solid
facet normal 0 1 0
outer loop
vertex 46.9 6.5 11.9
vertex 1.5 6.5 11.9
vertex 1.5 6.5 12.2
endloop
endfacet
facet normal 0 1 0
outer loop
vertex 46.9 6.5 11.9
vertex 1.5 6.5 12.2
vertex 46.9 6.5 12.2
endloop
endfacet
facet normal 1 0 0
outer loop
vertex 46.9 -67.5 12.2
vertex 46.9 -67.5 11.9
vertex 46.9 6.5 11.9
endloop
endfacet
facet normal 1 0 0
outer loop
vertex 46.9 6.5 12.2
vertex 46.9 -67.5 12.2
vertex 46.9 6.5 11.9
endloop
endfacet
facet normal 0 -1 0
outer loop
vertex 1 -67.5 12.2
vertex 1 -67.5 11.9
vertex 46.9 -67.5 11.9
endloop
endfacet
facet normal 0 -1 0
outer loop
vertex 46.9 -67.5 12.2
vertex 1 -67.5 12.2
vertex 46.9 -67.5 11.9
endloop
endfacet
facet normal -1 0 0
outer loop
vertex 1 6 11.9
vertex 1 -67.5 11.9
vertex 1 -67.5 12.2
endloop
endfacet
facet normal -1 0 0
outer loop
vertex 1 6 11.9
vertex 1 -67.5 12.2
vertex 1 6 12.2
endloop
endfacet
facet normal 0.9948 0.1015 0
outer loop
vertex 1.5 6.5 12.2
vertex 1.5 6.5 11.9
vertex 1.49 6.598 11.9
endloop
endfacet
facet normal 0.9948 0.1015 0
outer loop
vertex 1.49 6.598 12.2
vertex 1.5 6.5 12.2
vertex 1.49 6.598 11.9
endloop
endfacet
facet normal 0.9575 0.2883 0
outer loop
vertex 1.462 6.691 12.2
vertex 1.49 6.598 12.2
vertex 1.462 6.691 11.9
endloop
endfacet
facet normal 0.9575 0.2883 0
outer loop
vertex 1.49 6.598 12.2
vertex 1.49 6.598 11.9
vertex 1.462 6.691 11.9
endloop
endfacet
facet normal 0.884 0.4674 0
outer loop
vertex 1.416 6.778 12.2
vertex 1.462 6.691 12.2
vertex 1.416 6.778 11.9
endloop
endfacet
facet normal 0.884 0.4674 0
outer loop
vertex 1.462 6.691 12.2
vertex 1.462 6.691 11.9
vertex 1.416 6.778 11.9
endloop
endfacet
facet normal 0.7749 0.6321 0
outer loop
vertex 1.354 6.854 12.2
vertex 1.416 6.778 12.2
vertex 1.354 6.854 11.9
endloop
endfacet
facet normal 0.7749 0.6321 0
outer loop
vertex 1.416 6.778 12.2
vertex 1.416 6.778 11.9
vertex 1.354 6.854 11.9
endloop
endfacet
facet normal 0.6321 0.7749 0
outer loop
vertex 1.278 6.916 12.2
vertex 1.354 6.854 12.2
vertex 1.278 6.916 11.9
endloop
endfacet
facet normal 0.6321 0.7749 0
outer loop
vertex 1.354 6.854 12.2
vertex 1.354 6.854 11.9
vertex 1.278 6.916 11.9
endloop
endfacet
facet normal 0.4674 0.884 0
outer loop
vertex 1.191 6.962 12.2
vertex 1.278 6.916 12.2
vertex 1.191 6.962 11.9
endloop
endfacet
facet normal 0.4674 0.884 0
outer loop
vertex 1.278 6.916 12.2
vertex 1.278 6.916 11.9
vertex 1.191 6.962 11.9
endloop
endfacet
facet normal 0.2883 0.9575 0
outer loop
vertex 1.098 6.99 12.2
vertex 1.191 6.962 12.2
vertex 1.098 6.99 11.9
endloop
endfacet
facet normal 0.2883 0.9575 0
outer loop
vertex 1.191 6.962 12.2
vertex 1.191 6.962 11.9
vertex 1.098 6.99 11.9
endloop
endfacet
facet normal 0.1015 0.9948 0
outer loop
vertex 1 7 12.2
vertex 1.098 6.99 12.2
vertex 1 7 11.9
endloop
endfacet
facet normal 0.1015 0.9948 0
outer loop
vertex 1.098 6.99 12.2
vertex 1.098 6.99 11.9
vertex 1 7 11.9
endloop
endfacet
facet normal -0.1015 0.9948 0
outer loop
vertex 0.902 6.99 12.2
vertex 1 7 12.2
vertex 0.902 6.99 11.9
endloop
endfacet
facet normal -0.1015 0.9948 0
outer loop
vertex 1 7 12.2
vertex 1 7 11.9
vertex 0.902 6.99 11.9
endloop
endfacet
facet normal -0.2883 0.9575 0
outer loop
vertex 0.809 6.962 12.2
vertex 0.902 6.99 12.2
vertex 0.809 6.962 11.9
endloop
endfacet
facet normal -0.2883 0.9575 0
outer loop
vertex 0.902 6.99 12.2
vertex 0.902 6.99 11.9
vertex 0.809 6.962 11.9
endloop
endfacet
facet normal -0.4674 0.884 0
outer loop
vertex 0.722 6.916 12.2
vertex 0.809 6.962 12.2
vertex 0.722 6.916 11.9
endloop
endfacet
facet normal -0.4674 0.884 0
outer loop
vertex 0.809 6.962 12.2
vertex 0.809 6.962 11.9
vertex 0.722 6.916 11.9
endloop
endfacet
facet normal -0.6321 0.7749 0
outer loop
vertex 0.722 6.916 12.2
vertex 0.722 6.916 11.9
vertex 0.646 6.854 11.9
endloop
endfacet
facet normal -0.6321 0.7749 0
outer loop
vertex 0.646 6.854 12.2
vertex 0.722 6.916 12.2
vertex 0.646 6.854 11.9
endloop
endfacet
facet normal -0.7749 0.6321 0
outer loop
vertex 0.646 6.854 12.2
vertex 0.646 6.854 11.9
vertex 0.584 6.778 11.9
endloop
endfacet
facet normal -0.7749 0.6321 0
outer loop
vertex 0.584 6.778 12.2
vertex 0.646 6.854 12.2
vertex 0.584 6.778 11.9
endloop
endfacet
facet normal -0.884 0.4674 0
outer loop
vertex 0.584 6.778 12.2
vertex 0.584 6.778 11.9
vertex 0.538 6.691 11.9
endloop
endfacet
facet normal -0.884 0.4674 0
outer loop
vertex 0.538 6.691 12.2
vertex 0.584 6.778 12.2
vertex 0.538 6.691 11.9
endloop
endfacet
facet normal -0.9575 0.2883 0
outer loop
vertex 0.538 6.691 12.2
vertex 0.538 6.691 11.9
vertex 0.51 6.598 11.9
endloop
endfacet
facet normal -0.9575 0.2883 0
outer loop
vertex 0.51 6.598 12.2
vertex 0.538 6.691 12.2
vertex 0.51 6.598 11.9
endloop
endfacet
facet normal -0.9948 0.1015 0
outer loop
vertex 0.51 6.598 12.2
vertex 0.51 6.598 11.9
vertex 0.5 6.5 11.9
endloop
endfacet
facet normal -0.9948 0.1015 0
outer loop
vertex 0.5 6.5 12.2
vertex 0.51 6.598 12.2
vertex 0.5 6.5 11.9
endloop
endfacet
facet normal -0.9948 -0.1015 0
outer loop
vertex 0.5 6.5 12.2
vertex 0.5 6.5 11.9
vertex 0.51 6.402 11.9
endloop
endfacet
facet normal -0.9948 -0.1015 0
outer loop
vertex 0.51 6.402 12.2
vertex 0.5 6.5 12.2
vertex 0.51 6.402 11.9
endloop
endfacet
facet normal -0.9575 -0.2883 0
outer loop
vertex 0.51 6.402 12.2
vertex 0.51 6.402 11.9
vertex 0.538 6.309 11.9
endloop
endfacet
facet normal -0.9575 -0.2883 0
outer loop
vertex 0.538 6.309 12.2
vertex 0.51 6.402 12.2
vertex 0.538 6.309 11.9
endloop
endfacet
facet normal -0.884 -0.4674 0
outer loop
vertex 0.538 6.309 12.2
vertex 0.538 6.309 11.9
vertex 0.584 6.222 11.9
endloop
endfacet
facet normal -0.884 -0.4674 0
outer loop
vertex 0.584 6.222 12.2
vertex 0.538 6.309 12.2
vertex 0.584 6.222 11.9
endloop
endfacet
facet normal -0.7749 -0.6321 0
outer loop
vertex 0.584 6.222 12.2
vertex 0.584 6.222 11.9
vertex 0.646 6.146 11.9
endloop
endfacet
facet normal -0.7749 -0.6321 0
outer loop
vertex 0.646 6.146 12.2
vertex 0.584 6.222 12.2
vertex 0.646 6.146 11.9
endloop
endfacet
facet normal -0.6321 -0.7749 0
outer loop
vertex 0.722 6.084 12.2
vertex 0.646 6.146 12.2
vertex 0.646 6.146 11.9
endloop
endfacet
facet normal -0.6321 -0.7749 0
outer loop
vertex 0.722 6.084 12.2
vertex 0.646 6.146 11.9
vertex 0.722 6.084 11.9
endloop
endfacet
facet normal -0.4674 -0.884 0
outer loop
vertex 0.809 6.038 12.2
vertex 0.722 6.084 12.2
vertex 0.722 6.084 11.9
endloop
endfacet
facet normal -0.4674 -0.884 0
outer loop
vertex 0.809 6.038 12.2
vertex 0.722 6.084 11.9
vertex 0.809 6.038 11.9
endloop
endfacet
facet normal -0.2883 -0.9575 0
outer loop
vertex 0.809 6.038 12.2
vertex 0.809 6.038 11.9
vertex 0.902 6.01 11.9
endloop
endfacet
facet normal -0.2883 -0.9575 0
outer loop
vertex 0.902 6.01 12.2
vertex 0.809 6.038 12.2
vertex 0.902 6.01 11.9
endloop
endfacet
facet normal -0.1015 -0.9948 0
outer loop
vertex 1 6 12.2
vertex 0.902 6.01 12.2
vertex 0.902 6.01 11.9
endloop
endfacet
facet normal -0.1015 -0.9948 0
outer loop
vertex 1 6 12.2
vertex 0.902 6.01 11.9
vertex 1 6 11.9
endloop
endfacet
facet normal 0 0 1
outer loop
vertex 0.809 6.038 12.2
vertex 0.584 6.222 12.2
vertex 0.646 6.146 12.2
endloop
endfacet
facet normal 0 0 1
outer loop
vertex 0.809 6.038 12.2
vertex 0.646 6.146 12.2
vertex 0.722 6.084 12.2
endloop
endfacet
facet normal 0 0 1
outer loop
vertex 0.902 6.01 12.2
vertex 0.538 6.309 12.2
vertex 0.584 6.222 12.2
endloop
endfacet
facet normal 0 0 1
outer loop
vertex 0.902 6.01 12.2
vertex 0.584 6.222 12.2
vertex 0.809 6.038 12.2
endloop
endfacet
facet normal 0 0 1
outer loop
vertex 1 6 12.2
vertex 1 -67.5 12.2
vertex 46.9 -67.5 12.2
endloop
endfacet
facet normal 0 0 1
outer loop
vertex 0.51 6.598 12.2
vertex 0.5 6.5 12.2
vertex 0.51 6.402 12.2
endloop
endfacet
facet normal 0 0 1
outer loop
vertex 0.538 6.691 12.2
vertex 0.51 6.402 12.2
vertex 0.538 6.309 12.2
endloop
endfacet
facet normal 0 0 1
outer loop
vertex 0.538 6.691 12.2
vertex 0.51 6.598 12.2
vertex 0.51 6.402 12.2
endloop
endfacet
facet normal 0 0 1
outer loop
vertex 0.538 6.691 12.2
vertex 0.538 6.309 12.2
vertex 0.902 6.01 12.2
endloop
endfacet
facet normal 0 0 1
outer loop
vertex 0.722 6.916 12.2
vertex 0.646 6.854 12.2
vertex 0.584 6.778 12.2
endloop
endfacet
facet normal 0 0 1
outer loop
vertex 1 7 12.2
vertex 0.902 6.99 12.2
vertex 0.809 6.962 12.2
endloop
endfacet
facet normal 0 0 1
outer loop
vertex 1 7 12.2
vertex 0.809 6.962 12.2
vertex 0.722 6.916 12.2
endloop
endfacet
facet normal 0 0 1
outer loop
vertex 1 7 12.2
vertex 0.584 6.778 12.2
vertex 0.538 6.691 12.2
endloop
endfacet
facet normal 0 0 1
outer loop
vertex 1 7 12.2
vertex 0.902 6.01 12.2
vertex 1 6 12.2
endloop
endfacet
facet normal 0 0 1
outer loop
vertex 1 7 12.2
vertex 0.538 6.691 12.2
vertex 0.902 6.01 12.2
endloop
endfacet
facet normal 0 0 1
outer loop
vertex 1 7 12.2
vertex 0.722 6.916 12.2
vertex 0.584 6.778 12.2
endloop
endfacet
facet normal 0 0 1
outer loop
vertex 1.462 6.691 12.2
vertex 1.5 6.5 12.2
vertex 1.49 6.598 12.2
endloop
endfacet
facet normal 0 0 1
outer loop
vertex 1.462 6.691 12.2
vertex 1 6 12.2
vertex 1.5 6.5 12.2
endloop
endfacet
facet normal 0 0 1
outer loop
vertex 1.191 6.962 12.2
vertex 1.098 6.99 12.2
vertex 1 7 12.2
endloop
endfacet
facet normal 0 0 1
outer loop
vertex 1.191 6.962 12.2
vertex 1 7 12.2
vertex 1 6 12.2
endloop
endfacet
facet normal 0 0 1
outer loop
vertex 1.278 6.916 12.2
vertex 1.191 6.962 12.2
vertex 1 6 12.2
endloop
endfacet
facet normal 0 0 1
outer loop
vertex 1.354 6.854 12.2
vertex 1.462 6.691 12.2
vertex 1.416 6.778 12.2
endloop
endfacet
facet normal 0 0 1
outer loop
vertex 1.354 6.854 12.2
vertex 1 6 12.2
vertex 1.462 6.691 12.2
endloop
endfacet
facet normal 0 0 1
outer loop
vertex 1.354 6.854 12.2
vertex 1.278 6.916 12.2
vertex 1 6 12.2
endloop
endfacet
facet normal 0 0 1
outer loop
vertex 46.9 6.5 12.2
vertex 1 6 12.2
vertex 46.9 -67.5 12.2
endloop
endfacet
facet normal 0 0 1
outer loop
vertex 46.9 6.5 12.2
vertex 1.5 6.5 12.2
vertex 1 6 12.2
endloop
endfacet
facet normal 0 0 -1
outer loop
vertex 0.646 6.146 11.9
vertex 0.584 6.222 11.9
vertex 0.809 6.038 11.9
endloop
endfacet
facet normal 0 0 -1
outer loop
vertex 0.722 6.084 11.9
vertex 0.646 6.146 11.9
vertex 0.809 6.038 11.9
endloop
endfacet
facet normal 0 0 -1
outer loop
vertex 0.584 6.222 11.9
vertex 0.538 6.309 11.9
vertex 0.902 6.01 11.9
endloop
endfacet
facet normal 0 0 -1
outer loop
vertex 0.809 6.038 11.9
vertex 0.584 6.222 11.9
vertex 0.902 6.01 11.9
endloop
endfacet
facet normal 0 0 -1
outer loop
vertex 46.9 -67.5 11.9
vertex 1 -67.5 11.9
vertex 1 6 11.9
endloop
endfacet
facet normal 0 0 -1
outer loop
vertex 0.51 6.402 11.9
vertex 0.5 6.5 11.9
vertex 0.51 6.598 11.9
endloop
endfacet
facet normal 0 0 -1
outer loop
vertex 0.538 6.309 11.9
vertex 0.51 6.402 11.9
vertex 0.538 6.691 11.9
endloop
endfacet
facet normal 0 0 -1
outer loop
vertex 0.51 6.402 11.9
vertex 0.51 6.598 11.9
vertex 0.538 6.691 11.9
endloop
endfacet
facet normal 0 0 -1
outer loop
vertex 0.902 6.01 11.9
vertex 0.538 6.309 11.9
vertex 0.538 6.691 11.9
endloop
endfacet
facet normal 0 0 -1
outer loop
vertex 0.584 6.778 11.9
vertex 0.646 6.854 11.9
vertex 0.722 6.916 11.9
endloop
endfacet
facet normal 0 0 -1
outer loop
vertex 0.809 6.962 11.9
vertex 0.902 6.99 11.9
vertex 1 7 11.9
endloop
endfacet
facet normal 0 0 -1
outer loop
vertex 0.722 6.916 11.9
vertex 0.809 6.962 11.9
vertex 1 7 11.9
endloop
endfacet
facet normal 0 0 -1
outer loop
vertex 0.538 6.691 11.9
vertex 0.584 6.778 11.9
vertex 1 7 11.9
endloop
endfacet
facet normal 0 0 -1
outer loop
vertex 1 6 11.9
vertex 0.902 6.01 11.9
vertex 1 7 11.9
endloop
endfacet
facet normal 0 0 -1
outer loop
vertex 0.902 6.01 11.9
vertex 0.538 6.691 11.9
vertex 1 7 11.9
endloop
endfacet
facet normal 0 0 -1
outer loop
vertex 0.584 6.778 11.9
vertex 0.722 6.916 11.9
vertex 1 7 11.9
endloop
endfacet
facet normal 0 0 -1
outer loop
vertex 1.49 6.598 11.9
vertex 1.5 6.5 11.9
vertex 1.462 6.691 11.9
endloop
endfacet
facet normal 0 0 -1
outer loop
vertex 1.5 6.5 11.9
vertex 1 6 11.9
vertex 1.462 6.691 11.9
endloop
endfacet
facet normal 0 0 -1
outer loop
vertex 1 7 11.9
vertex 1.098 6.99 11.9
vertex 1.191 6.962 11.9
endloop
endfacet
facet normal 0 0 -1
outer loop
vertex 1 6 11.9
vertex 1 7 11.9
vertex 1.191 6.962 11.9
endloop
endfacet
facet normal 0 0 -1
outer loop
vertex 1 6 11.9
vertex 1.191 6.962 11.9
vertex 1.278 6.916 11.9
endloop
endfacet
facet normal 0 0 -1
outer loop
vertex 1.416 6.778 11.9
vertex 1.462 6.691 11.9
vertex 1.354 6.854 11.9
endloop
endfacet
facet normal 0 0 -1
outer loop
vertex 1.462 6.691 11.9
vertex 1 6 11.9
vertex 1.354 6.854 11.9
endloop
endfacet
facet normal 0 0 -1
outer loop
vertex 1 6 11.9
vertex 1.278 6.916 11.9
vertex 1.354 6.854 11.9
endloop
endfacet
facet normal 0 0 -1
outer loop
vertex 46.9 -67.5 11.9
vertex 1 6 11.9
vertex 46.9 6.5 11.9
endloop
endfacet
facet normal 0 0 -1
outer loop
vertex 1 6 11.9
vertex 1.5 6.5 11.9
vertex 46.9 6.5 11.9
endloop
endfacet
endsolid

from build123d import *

# Parameters (mm, degrees)
CYLINDER_R     = 0.5
CYLINDER_DEPTH = 0.3
BOX003_W       = 45.9
BOX003_H       = 74
BOX003_DEPTH   = 0.3


with BuildPart() as cylinder:
    # Cylinder → Cylinder (new body)
    with BuildSketch(Plane(origin=(1, 6.5, 11.9), x_dir=(1, 0, 0), z_dir=(0, 0, 1))):
        Circle(CYLINDER_R)
    extrude(amount=CYLINDER_DEPTH)


with BuildPart() as displayframe001:
    # Box003 → Box003 (new body)
    with BuildSketch(Plane(origin=(1, -67.5, 11.9), x_dir=(1, 0, 0), z_dir=(0, 0, 1))):
        with Locations((22.95, 37)):
            Rectangle(BOX003_W, BOX003_H)
    extrude(amount=BOX003_DEPTH)

    # Fusion: union Cylinder
    add(cylinder.part)


solid = displayframe001.part
